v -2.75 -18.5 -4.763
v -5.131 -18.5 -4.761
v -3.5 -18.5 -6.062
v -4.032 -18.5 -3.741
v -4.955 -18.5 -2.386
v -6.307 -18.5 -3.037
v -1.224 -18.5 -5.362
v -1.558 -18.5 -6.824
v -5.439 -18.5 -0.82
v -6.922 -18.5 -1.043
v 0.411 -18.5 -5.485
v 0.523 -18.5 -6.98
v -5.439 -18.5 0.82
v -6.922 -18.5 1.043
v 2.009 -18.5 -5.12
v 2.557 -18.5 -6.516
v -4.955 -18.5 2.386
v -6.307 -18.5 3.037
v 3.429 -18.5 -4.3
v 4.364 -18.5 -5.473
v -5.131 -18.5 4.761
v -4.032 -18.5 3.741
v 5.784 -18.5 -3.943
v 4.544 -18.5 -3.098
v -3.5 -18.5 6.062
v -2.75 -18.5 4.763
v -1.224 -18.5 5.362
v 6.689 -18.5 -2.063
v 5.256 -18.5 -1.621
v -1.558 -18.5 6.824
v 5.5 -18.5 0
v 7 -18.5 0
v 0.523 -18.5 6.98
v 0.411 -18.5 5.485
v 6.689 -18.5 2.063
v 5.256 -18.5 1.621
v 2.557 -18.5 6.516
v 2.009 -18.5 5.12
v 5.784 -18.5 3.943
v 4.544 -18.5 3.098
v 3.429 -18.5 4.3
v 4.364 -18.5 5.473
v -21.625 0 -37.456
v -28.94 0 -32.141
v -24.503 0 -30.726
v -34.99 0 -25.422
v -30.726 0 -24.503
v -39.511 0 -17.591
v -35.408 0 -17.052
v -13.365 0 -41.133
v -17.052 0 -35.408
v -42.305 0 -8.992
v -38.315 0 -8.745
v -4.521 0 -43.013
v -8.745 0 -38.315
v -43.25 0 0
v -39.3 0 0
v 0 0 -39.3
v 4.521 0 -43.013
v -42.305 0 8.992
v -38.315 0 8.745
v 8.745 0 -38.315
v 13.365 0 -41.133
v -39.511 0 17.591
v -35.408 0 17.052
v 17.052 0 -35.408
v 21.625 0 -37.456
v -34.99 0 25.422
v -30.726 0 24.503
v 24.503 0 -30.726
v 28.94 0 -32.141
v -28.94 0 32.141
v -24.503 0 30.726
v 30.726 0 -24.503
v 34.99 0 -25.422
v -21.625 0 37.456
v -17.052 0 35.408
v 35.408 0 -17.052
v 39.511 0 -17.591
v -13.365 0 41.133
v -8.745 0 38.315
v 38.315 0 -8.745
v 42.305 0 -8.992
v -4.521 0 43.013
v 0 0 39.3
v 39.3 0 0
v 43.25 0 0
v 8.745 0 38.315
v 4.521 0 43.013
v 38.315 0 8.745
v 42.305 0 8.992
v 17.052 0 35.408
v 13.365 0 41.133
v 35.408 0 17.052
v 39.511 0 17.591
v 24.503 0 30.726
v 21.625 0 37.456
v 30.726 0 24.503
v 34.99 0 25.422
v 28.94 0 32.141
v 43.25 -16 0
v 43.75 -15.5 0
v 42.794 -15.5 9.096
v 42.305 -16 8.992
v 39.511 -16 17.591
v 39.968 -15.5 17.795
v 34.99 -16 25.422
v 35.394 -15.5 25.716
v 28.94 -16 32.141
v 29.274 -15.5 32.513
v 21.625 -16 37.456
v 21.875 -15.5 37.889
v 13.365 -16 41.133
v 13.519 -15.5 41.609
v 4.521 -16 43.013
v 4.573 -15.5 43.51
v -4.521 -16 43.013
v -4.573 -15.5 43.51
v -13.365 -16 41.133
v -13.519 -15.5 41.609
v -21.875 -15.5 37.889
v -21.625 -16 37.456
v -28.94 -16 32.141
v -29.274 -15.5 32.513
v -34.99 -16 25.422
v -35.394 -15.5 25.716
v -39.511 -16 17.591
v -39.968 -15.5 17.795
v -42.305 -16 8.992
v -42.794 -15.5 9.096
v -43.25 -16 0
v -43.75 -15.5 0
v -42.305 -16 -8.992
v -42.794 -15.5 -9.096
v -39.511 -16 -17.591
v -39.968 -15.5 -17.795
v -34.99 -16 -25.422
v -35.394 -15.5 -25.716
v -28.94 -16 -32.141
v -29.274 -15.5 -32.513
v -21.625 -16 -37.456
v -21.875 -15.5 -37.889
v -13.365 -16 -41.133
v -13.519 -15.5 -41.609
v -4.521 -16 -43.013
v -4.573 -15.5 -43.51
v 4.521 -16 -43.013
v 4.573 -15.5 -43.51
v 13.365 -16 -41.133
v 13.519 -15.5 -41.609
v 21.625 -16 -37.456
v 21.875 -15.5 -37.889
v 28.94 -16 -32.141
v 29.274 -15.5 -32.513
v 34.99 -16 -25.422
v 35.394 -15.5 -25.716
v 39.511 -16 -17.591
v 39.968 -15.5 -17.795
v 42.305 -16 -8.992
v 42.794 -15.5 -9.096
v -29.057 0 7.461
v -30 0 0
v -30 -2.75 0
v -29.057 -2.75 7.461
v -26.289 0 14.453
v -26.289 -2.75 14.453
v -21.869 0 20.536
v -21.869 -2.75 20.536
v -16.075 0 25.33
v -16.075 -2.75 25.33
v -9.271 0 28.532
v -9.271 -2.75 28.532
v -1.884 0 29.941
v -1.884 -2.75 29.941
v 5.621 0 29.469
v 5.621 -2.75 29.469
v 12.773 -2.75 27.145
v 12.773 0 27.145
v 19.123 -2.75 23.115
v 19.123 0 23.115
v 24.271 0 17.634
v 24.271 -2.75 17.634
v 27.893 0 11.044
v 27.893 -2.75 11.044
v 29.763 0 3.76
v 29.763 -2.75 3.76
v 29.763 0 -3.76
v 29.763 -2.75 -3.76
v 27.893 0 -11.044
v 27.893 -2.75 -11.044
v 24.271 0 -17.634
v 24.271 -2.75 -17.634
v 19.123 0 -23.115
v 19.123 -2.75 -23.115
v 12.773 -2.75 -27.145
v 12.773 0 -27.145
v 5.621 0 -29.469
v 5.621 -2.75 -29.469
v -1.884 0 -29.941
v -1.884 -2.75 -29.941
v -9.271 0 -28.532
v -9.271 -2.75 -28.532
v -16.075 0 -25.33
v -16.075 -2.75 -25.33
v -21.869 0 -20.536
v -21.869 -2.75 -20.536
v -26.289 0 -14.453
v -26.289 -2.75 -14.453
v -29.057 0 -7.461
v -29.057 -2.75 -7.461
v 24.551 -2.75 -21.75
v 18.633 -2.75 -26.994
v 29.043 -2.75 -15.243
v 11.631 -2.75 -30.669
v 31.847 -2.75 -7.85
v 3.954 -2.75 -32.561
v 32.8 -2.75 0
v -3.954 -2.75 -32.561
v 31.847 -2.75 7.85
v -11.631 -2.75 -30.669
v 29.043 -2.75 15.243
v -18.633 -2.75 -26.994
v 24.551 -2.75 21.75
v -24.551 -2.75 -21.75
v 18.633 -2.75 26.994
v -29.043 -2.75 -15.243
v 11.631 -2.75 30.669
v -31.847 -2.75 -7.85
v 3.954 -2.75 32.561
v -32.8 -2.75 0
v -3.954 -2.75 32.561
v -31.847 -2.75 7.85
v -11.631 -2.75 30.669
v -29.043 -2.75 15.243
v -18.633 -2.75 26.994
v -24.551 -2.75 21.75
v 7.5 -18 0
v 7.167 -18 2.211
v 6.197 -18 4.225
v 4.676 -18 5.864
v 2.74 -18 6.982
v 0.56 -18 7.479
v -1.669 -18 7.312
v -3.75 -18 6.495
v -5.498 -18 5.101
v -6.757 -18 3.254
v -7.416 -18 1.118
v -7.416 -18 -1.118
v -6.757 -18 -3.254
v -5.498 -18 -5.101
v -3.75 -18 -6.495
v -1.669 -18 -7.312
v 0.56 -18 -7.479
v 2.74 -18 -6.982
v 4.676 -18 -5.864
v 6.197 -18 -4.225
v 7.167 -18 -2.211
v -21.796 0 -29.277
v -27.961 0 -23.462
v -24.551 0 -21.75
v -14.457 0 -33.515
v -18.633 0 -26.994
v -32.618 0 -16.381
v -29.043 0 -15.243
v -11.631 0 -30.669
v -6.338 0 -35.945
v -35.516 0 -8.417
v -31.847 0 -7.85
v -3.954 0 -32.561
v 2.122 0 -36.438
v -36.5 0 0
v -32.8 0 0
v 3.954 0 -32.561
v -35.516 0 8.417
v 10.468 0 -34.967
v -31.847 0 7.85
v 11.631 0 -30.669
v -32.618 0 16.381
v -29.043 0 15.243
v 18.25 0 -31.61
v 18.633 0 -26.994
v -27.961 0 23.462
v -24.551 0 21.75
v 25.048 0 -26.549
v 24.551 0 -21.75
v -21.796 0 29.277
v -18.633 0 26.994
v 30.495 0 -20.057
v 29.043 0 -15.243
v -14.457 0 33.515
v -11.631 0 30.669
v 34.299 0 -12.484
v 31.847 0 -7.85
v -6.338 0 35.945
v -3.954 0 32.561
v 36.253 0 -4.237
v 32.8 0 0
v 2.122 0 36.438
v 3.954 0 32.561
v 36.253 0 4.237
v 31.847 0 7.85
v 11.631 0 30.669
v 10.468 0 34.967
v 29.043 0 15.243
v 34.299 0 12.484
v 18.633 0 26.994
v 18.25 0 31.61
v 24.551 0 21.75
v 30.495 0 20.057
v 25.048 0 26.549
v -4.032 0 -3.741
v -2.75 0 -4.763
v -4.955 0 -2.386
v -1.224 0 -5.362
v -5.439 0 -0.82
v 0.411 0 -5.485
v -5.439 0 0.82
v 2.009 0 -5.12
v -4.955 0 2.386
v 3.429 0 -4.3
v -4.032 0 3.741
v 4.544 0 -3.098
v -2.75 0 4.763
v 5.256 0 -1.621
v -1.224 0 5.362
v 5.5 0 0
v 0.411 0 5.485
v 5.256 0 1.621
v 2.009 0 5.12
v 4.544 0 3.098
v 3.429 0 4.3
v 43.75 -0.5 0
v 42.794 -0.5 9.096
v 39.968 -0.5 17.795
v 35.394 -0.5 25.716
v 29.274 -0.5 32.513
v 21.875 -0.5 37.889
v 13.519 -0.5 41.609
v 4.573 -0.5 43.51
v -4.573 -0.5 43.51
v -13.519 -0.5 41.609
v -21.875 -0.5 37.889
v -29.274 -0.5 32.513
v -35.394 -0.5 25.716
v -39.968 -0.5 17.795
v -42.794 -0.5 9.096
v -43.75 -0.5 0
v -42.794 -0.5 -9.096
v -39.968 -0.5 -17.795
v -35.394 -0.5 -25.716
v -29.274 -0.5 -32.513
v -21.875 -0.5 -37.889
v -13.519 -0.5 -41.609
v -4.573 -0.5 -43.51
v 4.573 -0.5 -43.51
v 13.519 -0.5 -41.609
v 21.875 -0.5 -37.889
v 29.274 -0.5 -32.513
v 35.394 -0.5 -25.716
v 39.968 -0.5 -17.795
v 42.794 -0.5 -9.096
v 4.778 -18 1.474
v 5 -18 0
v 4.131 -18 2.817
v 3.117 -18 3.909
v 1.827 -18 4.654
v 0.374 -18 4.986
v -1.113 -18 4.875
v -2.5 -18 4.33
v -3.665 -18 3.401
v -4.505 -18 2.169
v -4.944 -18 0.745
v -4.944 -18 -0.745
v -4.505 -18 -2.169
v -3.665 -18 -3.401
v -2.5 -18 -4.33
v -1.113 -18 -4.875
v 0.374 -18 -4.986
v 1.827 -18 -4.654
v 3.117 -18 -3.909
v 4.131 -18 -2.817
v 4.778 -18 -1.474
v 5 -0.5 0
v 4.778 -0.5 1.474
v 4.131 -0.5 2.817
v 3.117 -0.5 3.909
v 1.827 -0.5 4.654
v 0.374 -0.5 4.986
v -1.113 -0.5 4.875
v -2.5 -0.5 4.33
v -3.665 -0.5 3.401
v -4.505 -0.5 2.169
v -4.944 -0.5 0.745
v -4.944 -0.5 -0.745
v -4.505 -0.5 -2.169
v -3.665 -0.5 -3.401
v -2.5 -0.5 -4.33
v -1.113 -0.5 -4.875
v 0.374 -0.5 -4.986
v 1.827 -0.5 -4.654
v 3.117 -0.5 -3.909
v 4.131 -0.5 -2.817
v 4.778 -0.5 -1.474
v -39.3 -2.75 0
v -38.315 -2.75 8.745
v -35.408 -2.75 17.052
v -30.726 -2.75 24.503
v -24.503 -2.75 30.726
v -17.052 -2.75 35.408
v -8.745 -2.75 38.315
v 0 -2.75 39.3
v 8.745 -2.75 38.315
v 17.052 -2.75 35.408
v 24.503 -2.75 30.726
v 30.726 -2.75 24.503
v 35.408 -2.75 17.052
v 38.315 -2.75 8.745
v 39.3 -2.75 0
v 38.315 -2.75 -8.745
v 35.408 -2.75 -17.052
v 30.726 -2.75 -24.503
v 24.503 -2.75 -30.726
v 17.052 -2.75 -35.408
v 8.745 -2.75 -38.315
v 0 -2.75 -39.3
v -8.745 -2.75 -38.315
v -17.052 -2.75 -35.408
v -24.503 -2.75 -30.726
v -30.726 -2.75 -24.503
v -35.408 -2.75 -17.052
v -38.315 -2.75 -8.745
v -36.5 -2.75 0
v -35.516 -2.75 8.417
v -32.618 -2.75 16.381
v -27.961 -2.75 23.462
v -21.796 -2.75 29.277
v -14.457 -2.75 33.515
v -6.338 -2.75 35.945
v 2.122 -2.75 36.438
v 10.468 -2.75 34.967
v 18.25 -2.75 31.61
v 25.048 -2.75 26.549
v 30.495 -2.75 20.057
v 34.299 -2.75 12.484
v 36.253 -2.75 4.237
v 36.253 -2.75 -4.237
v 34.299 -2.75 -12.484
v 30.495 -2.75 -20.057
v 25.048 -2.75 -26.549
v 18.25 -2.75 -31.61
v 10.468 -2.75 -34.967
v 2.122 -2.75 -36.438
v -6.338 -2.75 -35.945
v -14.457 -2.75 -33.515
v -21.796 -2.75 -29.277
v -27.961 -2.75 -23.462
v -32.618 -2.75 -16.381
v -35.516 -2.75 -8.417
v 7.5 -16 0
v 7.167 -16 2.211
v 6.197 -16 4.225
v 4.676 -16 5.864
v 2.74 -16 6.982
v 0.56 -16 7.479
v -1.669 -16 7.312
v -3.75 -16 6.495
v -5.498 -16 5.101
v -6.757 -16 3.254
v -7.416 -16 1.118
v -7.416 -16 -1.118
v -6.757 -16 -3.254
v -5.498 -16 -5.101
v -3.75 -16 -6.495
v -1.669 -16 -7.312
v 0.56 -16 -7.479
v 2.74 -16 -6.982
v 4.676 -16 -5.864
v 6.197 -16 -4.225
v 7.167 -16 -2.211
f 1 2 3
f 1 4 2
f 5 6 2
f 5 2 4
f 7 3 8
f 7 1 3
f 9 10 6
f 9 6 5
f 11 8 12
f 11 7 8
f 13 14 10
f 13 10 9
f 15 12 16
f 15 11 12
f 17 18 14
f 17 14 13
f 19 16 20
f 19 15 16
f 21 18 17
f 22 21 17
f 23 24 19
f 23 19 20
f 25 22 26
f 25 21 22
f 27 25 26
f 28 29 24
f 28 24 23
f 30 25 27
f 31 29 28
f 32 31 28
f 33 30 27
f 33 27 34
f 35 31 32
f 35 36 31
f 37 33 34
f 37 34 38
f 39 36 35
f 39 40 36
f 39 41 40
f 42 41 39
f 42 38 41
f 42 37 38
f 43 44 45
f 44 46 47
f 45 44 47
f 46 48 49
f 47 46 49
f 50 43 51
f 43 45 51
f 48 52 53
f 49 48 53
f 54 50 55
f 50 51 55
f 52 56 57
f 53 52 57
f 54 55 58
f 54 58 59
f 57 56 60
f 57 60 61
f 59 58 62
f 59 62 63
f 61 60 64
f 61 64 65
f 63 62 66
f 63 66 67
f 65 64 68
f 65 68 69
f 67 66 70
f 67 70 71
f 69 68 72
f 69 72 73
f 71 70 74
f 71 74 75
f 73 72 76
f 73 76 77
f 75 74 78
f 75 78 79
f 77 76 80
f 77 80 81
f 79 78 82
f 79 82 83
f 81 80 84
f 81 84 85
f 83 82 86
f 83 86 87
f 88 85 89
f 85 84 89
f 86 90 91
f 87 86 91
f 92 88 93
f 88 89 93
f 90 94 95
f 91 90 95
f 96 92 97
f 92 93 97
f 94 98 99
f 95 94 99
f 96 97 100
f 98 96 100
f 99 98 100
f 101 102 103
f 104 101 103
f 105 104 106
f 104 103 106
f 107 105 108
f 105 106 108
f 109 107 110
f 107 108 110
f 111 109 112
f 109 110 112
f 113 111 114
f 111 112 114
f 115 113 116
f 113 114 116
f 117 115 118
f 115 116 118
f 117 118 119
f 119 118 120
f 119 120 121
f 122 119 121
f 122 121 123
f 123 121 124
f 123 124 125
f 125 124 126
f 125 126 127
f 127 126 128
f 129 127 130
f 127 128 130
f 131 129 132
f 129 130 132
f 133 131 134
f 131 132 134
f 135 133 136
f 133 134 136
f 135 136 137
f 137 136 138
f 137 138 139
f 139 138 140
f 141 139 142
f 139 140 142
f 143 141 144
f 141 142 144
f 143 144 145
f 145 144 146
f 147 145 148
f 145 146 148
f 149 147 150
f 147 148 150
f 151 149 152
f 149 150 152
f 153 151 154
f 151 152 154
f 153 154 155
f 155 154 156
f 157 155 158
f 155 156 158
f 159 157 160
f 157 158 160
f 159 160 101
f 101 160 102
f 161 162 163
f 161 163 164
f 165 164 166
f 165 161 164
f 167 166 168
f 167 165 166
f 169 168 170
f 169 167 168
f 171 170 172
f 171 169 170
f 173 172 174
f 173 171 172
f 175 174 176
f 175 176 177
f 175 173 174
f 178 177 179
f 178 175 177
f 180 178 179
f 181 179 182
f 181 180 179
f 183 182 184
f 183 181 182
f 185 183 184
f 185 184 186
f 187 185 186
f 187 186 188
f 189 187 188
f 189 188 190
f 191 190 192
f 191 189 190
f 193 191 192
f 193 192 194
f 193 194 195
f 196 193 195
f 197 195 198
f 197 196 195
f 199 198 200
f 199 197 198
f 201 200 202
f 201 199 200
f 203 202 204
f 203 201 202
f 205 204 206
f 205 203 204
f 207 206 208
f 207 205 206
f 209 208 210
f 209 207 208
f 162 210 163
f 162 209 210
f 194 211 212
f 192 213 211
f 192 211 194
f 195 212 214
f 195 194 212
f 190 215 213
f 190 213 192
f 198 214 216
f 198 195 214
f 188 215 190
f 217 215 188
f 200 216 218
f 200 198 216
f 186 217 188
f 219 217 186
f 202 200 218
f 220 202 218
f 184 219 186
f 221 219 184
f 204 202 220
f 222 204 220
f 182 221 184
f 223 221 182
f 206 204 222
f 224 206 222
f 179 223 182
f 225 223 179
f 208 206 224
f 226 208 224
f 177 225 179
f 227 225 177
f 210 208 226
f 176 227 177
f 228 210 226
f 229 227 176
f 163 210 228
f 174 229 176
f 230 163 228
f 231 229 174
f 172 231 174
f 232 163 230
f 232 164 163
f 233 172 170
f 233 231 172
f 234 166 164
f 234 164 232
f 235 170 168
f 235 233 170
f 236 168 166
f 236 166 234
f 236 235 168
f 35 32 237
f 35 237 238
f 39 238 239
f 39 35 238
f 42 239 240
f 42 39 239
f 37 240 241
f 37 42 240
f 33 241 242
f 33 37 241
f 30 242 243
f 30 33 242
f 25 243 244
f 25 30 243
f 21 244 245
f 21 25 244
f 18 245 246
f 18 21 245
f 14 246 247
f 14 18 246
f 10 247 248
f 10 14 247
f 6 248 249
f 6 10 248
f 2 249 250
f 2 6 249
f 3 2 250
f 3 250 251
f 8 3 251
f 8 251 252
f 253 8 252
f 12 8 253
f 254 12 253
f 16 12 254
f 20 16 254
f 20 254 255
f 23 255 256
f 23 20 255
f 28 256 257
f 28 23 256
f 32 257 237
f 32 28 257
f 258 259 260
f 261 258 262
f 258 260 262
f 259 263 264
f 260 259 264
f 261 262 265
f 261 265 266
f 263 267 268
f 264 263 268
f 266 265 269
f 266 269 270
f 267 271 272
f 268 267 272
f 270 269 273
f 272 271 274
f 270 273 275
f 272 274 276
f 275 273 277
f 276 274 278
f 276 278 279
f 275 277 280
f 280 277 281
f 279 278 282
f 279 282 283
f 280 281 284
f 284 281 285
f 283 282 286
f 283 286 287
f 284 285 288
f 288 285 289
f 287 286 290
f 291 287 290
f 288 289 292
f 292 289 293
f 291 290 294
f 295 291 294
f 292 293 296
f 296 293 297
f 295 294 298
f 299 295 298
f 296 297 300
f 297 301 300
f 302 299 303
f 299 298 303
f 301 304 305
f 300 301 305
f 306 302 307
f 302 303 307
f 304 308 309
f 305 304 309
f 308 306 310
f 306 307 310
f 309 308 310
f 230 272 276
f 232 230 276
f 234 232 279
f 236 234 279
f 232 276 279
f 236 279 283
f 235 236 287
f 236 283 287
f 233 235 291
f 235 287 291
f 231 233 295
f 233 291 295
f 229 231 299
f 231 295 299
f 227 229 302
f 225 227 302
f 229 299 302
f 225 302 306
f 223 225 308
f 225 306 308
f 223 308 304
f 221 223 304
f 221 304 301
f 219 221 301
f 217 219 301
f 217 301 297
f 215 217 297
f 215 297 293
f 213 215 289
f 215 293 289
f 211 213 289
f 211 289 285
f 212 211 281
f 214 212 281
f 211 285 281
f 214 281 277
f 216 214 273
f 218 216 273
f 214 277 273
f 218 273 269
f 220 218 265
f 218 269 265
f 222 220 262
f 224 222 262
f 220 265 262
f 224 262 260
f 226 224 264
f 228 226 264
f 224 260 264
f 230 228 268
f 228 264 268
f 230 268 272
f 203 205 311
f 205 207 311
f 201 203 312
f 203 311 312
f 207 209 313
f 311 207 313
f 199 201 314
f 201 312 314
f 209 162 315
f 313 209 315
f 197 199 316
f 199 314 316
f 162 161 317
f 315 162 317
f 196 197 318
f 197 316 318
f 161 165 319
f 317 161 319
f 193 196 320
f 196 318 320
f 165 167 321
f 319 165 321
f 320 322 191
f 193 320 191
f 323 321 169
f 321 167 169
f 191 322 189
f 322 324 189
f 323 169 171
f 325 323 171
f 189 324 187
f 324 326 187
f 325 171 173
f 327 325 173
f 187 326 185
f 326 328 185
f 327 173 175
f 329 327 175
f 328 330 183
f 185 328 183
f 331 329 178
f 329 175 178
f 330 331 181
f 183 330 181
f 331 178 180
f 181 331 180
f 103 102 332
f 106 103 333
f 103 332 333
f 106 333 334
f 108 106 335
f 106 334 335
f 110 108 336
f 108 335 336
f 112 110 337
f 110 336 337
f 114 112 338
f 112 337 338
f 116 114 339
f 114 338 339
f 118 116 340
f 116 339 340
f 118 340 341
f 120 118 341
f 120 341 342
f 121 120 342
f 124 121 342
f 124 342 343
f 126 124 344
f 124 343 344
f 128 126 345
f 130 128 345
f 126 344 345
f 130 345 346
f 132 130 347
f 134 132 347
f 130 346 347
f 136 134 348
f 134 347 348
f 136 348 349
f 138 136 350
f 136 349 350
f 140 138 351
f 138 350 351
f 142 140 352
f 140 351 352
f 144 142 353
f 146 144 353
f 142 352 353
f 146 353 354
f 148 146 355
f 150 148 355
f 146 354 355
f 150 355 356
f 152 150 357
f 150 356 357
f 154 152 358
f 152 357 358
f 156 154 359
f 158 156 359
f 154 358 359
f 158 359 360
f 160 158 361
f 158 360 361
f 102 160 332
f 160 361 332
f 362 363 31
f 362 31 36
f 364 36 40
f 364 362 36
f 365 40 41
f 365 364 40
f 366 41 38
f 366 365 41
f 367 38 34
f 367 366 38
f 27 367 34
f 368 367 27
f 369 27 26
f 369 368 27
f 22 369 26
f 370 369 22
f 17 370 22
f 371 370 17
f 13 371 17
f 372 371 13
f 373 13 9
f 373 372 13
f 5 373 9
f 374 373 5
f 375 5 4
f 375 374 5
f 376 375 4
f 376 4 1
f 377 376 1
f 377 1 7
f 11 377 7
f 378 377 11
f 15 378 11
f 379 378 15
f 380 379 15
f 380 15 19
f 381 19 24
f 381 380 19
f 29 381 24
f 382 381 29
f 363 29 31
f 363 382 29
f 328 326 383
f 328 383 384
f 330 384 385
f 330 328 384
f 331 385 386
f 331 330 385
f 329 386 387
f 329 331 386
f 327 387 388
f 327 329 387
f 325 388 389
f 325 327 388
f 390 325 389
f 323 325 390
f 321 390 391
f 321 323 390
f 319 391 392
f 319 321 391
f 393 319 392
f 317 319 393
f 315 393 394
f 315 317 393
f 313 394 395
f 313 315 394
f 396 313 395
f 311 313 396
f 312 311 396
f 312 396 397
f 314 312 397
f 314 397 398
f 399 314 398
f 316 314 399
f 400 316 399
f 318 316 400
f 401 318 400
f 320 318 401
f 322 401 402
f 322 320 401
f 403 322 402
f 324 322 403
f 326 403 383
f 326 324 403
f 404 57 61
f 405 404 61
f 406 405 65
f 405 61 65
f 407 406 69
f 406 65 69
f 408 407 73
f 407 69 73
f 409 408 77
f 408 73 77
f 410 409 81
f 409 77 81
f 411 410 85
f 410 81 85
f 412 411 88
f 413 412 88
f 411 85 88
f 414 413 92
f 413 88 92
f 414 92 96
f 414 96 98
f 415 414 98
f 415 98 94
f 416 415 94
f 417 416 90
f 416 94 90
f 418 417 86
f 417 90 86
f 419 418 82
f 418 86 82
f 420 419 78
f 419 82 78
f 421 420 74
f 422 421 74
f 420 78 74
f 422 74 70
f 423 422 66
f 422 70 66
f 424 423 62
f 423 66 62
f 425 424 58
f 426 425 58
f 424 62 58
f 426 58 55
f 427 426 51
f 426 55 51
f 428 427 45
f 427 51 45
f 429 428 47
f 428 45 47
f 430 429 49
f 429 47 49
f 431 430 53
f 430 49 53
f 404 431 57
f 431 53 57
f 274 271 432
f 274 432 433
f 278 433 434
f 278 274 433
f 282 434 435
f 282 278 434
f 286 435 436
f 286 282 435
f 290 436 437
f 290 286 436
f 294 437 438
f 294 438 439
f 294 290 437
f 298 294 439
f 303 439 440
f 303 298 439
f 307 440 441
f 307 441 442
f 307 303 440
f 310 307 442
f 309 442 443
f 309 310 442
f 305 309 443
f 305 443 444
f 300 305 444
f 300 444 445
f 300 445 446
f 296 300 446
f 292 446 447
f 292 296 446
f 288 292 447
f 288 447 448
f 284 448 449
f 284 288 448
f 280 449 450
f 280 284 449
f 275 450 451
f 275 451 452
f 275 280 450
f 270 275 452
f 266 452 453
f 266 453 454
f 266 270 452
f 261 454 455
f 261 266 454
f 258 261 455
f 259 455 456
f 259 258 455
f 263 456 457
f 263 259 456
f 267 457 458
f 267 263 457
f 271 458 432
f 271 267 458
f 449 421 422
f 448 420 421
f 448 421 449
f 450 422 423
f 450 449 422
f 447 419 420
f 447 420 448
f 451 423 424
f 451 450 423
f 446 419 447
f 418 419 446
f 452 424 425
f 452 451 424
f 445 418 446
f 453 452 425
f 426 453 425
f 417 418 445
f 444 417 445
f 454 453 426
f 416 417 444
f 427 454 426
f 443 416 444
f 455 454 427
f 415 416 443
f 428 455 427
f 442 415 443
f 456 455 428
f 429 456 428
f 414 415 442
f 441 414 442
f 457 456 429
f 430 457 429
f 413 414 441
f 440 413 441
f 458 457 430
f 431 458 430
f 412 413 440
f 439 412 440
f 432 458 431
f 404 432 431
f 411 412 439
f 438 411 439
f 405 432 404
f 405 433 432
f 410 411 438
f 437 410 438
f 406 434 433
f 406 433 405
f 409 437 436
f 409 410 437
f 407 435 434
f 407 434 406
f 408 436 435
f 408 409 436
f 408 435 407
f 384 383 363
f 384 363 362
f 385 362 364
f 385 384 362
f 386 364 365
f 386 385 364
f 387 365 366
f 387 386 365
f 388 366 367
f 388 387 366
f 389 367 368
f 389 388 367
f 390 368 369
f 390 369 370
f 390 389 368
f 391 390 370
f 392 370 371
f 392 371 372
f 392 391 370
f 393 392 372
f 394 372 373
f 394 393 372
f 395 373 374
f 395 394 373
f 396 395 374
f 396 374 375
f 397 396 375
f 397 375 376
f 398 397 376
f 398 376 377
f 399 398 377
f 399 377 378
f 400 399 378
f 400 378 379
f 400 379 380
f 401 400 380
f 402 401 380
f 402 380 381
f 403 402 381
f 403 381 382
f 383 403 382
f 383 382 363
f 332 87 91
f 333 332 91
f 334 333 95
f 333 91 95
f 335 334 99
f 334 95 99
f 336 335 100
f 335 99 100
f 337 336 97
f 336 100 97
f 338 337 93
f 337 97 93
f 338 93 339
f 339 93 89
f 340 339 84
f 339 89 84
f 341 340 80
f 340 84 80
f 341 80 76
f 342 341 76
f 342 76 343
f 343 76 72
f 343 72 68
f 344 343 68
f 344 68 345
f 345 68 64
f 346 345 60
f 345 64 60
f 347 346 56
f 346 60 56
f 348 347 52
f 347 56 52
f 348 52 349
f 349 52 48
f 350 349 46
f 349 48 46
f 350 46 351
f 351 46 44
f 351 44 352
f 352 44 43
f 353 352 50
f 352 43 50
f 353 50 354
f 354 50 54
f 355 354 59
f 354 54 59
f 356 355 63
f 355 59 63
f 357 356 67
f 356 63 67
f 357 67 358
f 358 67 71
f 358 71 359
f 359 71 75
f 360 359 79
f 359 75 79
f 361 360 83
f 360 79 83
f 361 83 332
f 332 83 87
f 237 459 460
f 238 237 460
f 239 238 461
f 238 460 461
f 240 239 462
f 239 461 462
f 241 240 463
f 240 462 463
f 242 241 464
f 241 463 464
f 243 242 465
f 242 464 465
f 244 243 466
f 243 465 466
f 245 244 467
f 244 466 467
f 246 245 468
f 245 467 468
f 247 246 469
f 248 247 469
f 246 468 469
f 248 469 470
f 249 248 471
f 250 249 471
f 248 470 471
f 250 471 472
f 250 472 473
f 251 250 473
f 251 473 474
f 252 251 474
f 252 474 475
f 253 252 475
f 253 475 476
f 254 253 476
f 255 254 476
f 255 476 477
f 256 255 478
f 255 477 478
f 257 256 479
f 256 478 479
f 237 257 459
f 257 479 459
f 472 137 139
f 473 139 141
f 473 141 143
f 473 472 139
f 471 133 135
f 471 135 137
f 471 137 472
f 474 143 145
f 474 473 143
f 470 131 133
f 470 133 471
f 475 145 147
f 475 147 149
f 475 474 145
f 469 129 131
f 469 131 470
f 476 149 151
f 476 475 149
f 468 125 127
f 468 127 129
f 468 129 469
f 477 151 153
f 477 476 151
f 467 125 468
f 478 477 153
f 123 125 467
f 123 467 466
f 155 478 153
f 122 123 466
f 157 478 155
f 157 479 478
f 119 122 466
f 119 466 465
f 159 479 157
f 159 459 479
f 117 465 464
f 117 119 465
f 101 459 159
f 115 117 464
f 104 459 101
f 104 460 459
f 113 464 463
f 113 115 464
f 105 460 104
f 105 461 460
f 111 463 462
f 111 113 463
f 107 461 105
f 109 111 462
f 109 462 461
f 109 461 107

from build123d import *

# Parameters (mm, degrees)
F0_R     = 43.75
F0_R_2   = 5
F1_DEPTH = 16
F2_R     = 7.5
F2_R_2   = 5
F3_DEPTH = 2.5
F4_R     = 39.3
F4_R_2   = 36.5
F4_R_3   = 32.8
F4_R_4   = 30
F5_DEPTH = 2.75
F6_SIZE  = 0.5


with BuildPart() as f1:
    # F0 (on Front) → F1 (new body)
    with BuildSketch(Plane.XZ):
        Circle(F0_R)
        Circle(F0_R_2, mode=Mode.SUBTRACT)
    extrude(amount=F1_DEPTH)

    # F2 (on face) → F3 (join)
    with BuildSketch(Plane.XZ.offset(16)):
        Circle(F2_R)
        Circle(F2_R_2, mode=Mode.SUBTRACT)
    extrude(amount=F3_DEPTH)

    # F4 (on face) → F5 (cut)
    with BuildSketch(Plane(origin=(0, 0, 0), x_dir=(-1, 0, 0), z_dir=(0, 1, 0))):
        Circle(F4_R)
        Circle(F4_R_2, mode=Mode.SUBTRACT)
        Circle(F4_R_3)
        Circle(F4_R_4, mode=Mode.SUBTRACT)
    extrude(amount=-F5_DEPTH, mode=Mode.SUBTRACT)

    # F6
    f6_edges = [f1.edges().sort_by_distance(p)[0] for p in [
        (-7.5, -18.5, 0),
        (-5, -18.5, 0),
        (-43.75, -16, 0),
        (-43.75, 0, 0),
        (-5, 0, 0),
    ]]
    chamfer(f6_edges, length=F6_SIZE)


solid = f1.part
